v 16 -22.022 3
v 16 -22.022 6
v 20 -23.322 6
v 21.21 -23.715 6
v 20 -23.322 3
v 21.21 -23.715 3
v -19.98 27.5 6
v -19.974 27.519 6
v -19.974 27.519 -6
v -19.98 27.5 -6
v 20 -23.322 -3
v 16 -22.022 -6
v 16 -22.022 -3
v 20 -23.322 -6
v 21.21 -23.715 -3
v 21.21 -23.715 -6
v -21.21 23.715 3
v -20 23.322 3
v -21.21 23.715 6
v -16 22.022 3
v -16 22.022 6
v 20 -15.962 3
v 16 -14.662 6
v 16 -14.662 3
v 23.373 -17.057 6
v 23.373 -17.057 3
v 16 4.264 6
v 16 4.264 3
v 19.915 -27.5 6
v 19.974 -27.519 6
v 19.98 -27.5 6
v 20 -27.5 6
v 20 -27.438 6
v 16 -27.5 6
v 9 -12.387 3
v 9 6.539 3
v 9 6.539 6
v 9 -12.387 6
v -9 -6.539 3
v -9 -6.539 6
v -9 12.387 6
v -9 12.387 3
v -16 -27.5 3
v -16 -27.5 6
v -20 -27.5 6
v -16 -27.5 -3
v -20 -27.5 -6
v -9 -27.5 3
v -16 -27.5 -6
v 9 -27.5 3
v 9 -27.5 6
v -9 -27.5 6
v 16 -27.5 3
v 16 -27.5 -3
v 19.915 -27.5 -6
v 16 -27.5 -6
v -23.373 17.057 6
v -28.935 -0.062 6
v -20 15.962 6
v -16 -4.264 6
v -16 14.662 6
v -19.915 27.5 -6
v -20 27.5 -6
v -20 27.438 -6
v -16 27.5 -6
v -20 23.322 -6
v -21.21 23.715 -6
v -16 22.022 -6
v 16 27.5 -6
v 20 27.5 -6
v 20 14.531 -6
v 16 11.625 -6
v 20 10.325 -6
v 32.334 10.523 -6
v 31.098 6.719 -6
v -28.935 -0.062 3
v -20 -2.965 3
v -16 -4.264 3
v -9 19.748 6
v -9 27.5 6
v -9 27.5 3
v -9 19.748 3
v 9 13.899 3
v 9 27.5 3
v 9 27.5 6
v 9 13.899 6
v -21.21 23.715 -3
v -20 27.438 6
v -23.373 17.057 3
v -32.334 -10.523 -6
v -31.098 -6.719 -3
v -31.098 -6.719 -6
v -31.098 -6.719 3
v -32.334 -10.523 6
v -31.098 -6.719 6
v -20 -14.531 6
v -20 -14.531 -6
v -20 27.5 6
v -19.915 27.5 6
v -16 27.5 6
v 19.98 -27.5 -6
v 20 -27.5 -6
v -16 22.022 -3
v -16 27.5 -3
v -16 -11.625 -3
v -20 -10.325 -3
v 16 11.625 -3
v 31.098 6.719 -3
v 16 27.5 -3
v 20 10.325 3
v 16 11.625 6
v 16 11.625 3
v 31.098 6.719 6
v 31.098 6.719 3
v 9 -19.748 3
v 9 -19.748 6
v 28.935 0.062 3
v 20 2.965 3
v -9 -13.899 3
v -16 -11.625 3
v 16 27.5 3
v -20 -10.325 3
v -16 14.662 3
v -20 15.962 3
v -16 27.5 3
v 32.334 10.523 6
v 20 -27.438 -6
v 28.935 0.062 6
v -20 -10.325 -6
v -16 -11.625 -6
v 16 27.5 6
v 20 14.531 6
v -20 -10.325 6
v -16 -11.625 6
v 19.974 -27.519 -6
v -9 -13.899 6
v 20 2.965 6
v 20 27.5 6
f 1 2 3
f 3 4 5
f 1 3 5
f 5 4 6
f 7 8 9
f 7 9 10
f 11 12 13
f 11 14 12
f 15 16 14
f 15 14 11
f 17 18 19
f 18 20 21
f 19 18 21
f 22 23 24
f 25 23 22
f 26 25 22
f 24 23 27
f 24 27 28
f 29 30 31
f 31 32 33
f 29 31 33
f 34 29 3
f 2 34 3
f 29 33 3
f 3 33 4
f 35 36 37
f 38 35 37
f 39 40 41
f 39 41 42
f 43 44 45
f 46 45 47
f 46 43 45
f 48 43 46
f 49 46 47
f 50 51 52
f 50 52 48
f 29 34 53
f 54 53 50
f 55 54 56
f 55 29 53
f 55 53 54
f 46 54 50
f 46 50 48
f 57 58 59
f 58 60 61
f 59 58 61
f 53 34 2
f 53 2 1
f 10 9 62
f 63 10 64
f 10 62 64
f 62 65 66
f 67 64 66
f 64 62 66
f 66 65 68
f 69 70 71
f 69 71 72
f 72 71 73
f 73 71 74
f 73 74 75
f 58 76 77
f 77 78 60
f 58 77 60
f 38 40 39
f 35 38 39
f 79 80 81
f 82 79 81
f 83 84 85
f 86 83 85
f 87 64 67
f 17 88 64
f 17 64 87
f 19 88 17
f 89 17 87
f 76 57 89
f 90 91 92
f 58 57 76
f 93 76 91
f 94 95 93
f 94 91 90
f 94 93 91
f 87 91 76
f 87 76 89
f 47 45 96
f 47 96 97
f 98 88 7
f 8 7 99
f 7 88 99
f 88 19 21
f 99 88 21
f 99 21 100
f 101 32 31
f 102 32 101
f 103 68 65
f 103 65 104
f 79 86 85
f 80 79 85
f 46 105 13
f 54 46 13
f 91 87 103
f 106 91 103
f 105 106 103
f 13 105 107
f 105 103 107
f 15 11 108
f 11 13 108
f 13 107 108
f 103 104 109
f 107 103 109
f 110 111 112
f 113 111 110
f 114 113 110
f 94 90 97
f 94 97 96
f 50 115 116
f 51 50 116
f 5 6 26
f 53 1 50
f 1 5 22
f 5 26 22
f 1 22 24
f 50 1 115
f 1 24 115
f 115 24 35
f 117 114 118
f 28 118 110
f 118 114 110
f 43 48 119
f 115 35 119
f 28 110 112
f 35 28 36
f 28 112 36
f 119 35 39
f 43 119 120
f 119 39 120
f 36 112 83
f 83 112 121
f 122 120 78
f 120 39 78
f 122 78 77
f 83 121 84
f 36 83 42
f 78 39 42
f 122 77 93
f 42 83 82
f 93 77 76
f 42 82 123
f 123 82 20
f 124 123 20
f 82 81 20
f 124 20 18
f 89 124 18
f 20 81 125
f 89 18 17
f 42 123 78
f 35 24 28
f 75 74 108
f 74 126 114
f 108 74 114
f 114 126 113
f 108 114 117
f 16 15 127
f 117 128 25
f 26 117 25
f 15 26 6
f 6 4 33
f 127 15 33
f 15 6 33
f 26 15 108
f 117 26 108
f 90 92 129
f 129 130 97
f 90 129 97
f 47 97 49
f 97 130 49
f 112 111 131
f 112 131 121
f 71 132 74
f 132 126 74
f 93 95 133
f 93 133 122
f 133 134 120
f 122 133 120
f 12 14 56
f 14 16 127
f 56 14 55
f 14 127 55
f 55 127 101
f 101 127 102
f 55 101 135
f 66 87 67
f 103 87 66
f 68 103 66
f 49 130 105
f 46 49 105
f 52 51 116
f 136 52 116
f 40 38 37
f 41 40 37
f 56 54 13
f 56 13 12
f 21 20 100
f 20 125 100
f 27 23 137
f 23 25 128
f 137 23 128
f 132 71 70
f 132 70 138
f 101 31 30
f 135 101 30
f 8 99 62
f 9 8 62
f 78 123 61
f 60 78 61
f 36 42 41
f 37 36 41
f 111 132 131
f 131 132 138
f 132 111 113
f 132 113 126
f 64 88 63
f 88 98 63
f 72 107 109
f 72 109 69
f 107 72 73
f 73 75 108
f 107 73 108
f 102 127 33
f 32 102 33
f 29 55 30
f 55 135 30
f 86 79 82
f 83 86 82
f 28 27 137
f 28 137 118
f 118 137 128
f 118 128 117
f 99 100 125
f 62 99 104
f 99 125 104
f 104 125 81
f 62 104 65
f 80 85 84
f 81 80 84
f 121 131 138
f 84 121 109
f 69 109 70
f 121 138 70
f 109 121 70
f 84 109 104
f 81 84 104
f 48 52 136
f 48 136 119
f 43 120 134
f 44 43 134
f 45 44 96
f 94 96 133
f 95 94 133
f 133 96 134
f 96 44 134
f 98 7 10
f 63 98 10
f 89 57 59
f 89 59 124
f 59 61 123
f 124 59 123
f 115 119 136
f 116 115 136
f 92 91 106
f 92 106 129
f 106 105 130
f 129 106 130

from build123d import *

# Parameters (mm, degrees)
SKETCH004_W = 32
SKETCH004_H = 3
SKETCH005_W = 7
SKETCH005_H = 3
SKETCH006_W = 7
SKETCH006_H = 3
SKETCH007_W = 32
SKETCH007_H = 3
SKETCH008_W = 7
SKETCH008_H = 3
SKETCH009_W = 7
SKETCH009_H = 3


with BuildPart() as part:
    # AdditivePipe: sweep along a path in Sketch
    with BuildLine(Plane.XY) as additivepipe_path:
        Line((0, -27.5), (0, 27.5))
    # Sketch002 (on DatumPlane) → AdditivePipe (sweep)
    with BuildSketch(Plane.XZ.offset(27.5)):
        Polygon((-20, 6), (-20, -6), (-16, -6), (-16, -3), (-9, -3), (9, -3), (16, -3), (16, -6), (20, -6), (20, 6), (16, 6), (16, 3), (9, 3), (9, 6), (-9, 6), (-9, 3), (-16, 3), (-16, 6), align=None)
    sweep(path=additivepipe_path.line)

    # AdditivePipe001: sweep along a path in Sketch001
    with BuildLine(Plane.XY) as additivepipe001_path:
        Line((-26.154054, 8.497967), (26.154054, -8.497967))
    # Sketch003 (on DatumPlane) → AdditivePipe001 (sweep)
    with BuildSketch(Plane(origin=(-26.154054, 8.497967, 0), x_dir=(-0.309017, -0.951057, 0), z_dir=(-0.951057, 0.309017, 0))):
        Polygon((-20, 6), (-20, -6), (-16, -6), (-16, -3), (-9, -3), (9, -3), (16, -3), (16, -6), (20, -6), (20, 6), (16, 6), (16, 3), (9, 3), (9, 6), (-9, 6), (-9, 3), (-16, 3), (-16, 6), align=None)
    sweep(path=additivepipe001_path.line)

    # SubtractivePipe: sweep along a path in Sketch
    with BuildLine(Plane.XY) as subtractivepipe_path:
        Line((0, -27.5), (0, 27.5))
    # Sketch004 (on DatumPlane) → SubtractivePipe (sweep, cut)
    with BuildSketch(Plane.XZ.offset(27.5)):
        with Locations((0, -4.5)):
            Rectangle(SKETCH004_W, SKETCH004_H)
    sweep(path=subtractivepipe_path.line, mode=Mode.SUBTRACT)

    # SubtractivePipe001: sweep along a path in Sketch
    with BuildLine(Plane.XY) as subtractivepipe001_path:
        Line((0, -27.5), (0, 27.5))
    # Sketch005 (on DatumPlane) → SubtractivePipe001 (sweep, cut)
    with BuildSketch(Plane.XZ.offset(27.5)):
        with Locations((-12.5, 4.5)):
            Rectangle(SKETCH005_W, SKETCH005_H)
    sweep(path=subtractivepipe001_path.line, mode=Mode.SUBTRACT)

    # SubtractivePipe002: sweep along a path in Sketch
    with BuildLine(Plane.XY) as subtractivepipe002_path:
        Line((0, -27.5), (0, 27.5))
    # Sketch006 (on DatumPlane) → SubtractivePipe002 (sweep, cut)
    with BuildSketch(Plane.XZ.offset(27.5)):
        with Locations((12.5, 4.5)):
            Rectangle(SKETCH006_W, SKETCH006_H)
    sweep(path=subtractivepipe002_path.line, mode=Mode.SUBTRACT)

    # SubtractivePipe003: sweep along a path in Sketch001
    with BuildLine(Plane.XY) as subtractivepipe003_path:
        Line((-26.154054, 8.497967), (26.154054, -8.497967))
    # Sketch007 (on DatumPlane) → SubtractivePipe003 (sweep, cut)
    with BuildSketch(Plane(origin=(-26.154054, 8.497967, 0), x_dir=(-0.309017, -0.951057, 0), z_dir=(-0.951057, 0.309017, 0))):
        with Locations((0, -4.5)):
            Rectangle(SKETCH007_W, SKETCH007_H)
    sweep(path=subtractivepipe003_path.line, mode=Mode.SUBTRACT)

    # SubtractivePipe004: sweep along a path in Sketch001
    with BuildLine(Plane.XY) as subtractivepipe004_path:
        Line((-26.154054, 8.497967), (26.154054, -8.497967))
    # Sketch008 (on DatumPlane) → SubtractivePipe004 (sweep, cut)
    with BuildSketch(Plane(origin=(-26.154054, 8.497967, 0), x_dir=(-0.309017, -0.951057, 0), z_dir=(-0.951057, 0.309017, 0))):
        with Locations((-12.5, 4.5)):
            Rectangle(SKETCH008_W, SKETCH008_H)
    sweep(path=subtractivepipe004_path.line, mode=Mode.SUBTRACT)

    # SubtractivePipe005: sweep along a path in Sketch001
    with BuildLine(Plane.XY) as subtractivepipe005_path:
        Line((-26.154054, 8.497967), (26.154054, -8.497967))
    # Sketch009 (on DatumPlane) → SubtractivePipe005 (sweep, cut)
    with BuildSketch(Plane(origin=(-26.154054, 8.497967, 0), x_dir=(-0.309017, -0.951057, 0), z_dir=(-0.951057, 0.309017, 0))):
        with Locations((12.5, 4.5)):
            Rectangle(SKETCH009_W, SKETCH009_H)
    sweep(path=subtractivepipe005_path.line, mode=Mode.SUBTRACT)


solid = part.part
